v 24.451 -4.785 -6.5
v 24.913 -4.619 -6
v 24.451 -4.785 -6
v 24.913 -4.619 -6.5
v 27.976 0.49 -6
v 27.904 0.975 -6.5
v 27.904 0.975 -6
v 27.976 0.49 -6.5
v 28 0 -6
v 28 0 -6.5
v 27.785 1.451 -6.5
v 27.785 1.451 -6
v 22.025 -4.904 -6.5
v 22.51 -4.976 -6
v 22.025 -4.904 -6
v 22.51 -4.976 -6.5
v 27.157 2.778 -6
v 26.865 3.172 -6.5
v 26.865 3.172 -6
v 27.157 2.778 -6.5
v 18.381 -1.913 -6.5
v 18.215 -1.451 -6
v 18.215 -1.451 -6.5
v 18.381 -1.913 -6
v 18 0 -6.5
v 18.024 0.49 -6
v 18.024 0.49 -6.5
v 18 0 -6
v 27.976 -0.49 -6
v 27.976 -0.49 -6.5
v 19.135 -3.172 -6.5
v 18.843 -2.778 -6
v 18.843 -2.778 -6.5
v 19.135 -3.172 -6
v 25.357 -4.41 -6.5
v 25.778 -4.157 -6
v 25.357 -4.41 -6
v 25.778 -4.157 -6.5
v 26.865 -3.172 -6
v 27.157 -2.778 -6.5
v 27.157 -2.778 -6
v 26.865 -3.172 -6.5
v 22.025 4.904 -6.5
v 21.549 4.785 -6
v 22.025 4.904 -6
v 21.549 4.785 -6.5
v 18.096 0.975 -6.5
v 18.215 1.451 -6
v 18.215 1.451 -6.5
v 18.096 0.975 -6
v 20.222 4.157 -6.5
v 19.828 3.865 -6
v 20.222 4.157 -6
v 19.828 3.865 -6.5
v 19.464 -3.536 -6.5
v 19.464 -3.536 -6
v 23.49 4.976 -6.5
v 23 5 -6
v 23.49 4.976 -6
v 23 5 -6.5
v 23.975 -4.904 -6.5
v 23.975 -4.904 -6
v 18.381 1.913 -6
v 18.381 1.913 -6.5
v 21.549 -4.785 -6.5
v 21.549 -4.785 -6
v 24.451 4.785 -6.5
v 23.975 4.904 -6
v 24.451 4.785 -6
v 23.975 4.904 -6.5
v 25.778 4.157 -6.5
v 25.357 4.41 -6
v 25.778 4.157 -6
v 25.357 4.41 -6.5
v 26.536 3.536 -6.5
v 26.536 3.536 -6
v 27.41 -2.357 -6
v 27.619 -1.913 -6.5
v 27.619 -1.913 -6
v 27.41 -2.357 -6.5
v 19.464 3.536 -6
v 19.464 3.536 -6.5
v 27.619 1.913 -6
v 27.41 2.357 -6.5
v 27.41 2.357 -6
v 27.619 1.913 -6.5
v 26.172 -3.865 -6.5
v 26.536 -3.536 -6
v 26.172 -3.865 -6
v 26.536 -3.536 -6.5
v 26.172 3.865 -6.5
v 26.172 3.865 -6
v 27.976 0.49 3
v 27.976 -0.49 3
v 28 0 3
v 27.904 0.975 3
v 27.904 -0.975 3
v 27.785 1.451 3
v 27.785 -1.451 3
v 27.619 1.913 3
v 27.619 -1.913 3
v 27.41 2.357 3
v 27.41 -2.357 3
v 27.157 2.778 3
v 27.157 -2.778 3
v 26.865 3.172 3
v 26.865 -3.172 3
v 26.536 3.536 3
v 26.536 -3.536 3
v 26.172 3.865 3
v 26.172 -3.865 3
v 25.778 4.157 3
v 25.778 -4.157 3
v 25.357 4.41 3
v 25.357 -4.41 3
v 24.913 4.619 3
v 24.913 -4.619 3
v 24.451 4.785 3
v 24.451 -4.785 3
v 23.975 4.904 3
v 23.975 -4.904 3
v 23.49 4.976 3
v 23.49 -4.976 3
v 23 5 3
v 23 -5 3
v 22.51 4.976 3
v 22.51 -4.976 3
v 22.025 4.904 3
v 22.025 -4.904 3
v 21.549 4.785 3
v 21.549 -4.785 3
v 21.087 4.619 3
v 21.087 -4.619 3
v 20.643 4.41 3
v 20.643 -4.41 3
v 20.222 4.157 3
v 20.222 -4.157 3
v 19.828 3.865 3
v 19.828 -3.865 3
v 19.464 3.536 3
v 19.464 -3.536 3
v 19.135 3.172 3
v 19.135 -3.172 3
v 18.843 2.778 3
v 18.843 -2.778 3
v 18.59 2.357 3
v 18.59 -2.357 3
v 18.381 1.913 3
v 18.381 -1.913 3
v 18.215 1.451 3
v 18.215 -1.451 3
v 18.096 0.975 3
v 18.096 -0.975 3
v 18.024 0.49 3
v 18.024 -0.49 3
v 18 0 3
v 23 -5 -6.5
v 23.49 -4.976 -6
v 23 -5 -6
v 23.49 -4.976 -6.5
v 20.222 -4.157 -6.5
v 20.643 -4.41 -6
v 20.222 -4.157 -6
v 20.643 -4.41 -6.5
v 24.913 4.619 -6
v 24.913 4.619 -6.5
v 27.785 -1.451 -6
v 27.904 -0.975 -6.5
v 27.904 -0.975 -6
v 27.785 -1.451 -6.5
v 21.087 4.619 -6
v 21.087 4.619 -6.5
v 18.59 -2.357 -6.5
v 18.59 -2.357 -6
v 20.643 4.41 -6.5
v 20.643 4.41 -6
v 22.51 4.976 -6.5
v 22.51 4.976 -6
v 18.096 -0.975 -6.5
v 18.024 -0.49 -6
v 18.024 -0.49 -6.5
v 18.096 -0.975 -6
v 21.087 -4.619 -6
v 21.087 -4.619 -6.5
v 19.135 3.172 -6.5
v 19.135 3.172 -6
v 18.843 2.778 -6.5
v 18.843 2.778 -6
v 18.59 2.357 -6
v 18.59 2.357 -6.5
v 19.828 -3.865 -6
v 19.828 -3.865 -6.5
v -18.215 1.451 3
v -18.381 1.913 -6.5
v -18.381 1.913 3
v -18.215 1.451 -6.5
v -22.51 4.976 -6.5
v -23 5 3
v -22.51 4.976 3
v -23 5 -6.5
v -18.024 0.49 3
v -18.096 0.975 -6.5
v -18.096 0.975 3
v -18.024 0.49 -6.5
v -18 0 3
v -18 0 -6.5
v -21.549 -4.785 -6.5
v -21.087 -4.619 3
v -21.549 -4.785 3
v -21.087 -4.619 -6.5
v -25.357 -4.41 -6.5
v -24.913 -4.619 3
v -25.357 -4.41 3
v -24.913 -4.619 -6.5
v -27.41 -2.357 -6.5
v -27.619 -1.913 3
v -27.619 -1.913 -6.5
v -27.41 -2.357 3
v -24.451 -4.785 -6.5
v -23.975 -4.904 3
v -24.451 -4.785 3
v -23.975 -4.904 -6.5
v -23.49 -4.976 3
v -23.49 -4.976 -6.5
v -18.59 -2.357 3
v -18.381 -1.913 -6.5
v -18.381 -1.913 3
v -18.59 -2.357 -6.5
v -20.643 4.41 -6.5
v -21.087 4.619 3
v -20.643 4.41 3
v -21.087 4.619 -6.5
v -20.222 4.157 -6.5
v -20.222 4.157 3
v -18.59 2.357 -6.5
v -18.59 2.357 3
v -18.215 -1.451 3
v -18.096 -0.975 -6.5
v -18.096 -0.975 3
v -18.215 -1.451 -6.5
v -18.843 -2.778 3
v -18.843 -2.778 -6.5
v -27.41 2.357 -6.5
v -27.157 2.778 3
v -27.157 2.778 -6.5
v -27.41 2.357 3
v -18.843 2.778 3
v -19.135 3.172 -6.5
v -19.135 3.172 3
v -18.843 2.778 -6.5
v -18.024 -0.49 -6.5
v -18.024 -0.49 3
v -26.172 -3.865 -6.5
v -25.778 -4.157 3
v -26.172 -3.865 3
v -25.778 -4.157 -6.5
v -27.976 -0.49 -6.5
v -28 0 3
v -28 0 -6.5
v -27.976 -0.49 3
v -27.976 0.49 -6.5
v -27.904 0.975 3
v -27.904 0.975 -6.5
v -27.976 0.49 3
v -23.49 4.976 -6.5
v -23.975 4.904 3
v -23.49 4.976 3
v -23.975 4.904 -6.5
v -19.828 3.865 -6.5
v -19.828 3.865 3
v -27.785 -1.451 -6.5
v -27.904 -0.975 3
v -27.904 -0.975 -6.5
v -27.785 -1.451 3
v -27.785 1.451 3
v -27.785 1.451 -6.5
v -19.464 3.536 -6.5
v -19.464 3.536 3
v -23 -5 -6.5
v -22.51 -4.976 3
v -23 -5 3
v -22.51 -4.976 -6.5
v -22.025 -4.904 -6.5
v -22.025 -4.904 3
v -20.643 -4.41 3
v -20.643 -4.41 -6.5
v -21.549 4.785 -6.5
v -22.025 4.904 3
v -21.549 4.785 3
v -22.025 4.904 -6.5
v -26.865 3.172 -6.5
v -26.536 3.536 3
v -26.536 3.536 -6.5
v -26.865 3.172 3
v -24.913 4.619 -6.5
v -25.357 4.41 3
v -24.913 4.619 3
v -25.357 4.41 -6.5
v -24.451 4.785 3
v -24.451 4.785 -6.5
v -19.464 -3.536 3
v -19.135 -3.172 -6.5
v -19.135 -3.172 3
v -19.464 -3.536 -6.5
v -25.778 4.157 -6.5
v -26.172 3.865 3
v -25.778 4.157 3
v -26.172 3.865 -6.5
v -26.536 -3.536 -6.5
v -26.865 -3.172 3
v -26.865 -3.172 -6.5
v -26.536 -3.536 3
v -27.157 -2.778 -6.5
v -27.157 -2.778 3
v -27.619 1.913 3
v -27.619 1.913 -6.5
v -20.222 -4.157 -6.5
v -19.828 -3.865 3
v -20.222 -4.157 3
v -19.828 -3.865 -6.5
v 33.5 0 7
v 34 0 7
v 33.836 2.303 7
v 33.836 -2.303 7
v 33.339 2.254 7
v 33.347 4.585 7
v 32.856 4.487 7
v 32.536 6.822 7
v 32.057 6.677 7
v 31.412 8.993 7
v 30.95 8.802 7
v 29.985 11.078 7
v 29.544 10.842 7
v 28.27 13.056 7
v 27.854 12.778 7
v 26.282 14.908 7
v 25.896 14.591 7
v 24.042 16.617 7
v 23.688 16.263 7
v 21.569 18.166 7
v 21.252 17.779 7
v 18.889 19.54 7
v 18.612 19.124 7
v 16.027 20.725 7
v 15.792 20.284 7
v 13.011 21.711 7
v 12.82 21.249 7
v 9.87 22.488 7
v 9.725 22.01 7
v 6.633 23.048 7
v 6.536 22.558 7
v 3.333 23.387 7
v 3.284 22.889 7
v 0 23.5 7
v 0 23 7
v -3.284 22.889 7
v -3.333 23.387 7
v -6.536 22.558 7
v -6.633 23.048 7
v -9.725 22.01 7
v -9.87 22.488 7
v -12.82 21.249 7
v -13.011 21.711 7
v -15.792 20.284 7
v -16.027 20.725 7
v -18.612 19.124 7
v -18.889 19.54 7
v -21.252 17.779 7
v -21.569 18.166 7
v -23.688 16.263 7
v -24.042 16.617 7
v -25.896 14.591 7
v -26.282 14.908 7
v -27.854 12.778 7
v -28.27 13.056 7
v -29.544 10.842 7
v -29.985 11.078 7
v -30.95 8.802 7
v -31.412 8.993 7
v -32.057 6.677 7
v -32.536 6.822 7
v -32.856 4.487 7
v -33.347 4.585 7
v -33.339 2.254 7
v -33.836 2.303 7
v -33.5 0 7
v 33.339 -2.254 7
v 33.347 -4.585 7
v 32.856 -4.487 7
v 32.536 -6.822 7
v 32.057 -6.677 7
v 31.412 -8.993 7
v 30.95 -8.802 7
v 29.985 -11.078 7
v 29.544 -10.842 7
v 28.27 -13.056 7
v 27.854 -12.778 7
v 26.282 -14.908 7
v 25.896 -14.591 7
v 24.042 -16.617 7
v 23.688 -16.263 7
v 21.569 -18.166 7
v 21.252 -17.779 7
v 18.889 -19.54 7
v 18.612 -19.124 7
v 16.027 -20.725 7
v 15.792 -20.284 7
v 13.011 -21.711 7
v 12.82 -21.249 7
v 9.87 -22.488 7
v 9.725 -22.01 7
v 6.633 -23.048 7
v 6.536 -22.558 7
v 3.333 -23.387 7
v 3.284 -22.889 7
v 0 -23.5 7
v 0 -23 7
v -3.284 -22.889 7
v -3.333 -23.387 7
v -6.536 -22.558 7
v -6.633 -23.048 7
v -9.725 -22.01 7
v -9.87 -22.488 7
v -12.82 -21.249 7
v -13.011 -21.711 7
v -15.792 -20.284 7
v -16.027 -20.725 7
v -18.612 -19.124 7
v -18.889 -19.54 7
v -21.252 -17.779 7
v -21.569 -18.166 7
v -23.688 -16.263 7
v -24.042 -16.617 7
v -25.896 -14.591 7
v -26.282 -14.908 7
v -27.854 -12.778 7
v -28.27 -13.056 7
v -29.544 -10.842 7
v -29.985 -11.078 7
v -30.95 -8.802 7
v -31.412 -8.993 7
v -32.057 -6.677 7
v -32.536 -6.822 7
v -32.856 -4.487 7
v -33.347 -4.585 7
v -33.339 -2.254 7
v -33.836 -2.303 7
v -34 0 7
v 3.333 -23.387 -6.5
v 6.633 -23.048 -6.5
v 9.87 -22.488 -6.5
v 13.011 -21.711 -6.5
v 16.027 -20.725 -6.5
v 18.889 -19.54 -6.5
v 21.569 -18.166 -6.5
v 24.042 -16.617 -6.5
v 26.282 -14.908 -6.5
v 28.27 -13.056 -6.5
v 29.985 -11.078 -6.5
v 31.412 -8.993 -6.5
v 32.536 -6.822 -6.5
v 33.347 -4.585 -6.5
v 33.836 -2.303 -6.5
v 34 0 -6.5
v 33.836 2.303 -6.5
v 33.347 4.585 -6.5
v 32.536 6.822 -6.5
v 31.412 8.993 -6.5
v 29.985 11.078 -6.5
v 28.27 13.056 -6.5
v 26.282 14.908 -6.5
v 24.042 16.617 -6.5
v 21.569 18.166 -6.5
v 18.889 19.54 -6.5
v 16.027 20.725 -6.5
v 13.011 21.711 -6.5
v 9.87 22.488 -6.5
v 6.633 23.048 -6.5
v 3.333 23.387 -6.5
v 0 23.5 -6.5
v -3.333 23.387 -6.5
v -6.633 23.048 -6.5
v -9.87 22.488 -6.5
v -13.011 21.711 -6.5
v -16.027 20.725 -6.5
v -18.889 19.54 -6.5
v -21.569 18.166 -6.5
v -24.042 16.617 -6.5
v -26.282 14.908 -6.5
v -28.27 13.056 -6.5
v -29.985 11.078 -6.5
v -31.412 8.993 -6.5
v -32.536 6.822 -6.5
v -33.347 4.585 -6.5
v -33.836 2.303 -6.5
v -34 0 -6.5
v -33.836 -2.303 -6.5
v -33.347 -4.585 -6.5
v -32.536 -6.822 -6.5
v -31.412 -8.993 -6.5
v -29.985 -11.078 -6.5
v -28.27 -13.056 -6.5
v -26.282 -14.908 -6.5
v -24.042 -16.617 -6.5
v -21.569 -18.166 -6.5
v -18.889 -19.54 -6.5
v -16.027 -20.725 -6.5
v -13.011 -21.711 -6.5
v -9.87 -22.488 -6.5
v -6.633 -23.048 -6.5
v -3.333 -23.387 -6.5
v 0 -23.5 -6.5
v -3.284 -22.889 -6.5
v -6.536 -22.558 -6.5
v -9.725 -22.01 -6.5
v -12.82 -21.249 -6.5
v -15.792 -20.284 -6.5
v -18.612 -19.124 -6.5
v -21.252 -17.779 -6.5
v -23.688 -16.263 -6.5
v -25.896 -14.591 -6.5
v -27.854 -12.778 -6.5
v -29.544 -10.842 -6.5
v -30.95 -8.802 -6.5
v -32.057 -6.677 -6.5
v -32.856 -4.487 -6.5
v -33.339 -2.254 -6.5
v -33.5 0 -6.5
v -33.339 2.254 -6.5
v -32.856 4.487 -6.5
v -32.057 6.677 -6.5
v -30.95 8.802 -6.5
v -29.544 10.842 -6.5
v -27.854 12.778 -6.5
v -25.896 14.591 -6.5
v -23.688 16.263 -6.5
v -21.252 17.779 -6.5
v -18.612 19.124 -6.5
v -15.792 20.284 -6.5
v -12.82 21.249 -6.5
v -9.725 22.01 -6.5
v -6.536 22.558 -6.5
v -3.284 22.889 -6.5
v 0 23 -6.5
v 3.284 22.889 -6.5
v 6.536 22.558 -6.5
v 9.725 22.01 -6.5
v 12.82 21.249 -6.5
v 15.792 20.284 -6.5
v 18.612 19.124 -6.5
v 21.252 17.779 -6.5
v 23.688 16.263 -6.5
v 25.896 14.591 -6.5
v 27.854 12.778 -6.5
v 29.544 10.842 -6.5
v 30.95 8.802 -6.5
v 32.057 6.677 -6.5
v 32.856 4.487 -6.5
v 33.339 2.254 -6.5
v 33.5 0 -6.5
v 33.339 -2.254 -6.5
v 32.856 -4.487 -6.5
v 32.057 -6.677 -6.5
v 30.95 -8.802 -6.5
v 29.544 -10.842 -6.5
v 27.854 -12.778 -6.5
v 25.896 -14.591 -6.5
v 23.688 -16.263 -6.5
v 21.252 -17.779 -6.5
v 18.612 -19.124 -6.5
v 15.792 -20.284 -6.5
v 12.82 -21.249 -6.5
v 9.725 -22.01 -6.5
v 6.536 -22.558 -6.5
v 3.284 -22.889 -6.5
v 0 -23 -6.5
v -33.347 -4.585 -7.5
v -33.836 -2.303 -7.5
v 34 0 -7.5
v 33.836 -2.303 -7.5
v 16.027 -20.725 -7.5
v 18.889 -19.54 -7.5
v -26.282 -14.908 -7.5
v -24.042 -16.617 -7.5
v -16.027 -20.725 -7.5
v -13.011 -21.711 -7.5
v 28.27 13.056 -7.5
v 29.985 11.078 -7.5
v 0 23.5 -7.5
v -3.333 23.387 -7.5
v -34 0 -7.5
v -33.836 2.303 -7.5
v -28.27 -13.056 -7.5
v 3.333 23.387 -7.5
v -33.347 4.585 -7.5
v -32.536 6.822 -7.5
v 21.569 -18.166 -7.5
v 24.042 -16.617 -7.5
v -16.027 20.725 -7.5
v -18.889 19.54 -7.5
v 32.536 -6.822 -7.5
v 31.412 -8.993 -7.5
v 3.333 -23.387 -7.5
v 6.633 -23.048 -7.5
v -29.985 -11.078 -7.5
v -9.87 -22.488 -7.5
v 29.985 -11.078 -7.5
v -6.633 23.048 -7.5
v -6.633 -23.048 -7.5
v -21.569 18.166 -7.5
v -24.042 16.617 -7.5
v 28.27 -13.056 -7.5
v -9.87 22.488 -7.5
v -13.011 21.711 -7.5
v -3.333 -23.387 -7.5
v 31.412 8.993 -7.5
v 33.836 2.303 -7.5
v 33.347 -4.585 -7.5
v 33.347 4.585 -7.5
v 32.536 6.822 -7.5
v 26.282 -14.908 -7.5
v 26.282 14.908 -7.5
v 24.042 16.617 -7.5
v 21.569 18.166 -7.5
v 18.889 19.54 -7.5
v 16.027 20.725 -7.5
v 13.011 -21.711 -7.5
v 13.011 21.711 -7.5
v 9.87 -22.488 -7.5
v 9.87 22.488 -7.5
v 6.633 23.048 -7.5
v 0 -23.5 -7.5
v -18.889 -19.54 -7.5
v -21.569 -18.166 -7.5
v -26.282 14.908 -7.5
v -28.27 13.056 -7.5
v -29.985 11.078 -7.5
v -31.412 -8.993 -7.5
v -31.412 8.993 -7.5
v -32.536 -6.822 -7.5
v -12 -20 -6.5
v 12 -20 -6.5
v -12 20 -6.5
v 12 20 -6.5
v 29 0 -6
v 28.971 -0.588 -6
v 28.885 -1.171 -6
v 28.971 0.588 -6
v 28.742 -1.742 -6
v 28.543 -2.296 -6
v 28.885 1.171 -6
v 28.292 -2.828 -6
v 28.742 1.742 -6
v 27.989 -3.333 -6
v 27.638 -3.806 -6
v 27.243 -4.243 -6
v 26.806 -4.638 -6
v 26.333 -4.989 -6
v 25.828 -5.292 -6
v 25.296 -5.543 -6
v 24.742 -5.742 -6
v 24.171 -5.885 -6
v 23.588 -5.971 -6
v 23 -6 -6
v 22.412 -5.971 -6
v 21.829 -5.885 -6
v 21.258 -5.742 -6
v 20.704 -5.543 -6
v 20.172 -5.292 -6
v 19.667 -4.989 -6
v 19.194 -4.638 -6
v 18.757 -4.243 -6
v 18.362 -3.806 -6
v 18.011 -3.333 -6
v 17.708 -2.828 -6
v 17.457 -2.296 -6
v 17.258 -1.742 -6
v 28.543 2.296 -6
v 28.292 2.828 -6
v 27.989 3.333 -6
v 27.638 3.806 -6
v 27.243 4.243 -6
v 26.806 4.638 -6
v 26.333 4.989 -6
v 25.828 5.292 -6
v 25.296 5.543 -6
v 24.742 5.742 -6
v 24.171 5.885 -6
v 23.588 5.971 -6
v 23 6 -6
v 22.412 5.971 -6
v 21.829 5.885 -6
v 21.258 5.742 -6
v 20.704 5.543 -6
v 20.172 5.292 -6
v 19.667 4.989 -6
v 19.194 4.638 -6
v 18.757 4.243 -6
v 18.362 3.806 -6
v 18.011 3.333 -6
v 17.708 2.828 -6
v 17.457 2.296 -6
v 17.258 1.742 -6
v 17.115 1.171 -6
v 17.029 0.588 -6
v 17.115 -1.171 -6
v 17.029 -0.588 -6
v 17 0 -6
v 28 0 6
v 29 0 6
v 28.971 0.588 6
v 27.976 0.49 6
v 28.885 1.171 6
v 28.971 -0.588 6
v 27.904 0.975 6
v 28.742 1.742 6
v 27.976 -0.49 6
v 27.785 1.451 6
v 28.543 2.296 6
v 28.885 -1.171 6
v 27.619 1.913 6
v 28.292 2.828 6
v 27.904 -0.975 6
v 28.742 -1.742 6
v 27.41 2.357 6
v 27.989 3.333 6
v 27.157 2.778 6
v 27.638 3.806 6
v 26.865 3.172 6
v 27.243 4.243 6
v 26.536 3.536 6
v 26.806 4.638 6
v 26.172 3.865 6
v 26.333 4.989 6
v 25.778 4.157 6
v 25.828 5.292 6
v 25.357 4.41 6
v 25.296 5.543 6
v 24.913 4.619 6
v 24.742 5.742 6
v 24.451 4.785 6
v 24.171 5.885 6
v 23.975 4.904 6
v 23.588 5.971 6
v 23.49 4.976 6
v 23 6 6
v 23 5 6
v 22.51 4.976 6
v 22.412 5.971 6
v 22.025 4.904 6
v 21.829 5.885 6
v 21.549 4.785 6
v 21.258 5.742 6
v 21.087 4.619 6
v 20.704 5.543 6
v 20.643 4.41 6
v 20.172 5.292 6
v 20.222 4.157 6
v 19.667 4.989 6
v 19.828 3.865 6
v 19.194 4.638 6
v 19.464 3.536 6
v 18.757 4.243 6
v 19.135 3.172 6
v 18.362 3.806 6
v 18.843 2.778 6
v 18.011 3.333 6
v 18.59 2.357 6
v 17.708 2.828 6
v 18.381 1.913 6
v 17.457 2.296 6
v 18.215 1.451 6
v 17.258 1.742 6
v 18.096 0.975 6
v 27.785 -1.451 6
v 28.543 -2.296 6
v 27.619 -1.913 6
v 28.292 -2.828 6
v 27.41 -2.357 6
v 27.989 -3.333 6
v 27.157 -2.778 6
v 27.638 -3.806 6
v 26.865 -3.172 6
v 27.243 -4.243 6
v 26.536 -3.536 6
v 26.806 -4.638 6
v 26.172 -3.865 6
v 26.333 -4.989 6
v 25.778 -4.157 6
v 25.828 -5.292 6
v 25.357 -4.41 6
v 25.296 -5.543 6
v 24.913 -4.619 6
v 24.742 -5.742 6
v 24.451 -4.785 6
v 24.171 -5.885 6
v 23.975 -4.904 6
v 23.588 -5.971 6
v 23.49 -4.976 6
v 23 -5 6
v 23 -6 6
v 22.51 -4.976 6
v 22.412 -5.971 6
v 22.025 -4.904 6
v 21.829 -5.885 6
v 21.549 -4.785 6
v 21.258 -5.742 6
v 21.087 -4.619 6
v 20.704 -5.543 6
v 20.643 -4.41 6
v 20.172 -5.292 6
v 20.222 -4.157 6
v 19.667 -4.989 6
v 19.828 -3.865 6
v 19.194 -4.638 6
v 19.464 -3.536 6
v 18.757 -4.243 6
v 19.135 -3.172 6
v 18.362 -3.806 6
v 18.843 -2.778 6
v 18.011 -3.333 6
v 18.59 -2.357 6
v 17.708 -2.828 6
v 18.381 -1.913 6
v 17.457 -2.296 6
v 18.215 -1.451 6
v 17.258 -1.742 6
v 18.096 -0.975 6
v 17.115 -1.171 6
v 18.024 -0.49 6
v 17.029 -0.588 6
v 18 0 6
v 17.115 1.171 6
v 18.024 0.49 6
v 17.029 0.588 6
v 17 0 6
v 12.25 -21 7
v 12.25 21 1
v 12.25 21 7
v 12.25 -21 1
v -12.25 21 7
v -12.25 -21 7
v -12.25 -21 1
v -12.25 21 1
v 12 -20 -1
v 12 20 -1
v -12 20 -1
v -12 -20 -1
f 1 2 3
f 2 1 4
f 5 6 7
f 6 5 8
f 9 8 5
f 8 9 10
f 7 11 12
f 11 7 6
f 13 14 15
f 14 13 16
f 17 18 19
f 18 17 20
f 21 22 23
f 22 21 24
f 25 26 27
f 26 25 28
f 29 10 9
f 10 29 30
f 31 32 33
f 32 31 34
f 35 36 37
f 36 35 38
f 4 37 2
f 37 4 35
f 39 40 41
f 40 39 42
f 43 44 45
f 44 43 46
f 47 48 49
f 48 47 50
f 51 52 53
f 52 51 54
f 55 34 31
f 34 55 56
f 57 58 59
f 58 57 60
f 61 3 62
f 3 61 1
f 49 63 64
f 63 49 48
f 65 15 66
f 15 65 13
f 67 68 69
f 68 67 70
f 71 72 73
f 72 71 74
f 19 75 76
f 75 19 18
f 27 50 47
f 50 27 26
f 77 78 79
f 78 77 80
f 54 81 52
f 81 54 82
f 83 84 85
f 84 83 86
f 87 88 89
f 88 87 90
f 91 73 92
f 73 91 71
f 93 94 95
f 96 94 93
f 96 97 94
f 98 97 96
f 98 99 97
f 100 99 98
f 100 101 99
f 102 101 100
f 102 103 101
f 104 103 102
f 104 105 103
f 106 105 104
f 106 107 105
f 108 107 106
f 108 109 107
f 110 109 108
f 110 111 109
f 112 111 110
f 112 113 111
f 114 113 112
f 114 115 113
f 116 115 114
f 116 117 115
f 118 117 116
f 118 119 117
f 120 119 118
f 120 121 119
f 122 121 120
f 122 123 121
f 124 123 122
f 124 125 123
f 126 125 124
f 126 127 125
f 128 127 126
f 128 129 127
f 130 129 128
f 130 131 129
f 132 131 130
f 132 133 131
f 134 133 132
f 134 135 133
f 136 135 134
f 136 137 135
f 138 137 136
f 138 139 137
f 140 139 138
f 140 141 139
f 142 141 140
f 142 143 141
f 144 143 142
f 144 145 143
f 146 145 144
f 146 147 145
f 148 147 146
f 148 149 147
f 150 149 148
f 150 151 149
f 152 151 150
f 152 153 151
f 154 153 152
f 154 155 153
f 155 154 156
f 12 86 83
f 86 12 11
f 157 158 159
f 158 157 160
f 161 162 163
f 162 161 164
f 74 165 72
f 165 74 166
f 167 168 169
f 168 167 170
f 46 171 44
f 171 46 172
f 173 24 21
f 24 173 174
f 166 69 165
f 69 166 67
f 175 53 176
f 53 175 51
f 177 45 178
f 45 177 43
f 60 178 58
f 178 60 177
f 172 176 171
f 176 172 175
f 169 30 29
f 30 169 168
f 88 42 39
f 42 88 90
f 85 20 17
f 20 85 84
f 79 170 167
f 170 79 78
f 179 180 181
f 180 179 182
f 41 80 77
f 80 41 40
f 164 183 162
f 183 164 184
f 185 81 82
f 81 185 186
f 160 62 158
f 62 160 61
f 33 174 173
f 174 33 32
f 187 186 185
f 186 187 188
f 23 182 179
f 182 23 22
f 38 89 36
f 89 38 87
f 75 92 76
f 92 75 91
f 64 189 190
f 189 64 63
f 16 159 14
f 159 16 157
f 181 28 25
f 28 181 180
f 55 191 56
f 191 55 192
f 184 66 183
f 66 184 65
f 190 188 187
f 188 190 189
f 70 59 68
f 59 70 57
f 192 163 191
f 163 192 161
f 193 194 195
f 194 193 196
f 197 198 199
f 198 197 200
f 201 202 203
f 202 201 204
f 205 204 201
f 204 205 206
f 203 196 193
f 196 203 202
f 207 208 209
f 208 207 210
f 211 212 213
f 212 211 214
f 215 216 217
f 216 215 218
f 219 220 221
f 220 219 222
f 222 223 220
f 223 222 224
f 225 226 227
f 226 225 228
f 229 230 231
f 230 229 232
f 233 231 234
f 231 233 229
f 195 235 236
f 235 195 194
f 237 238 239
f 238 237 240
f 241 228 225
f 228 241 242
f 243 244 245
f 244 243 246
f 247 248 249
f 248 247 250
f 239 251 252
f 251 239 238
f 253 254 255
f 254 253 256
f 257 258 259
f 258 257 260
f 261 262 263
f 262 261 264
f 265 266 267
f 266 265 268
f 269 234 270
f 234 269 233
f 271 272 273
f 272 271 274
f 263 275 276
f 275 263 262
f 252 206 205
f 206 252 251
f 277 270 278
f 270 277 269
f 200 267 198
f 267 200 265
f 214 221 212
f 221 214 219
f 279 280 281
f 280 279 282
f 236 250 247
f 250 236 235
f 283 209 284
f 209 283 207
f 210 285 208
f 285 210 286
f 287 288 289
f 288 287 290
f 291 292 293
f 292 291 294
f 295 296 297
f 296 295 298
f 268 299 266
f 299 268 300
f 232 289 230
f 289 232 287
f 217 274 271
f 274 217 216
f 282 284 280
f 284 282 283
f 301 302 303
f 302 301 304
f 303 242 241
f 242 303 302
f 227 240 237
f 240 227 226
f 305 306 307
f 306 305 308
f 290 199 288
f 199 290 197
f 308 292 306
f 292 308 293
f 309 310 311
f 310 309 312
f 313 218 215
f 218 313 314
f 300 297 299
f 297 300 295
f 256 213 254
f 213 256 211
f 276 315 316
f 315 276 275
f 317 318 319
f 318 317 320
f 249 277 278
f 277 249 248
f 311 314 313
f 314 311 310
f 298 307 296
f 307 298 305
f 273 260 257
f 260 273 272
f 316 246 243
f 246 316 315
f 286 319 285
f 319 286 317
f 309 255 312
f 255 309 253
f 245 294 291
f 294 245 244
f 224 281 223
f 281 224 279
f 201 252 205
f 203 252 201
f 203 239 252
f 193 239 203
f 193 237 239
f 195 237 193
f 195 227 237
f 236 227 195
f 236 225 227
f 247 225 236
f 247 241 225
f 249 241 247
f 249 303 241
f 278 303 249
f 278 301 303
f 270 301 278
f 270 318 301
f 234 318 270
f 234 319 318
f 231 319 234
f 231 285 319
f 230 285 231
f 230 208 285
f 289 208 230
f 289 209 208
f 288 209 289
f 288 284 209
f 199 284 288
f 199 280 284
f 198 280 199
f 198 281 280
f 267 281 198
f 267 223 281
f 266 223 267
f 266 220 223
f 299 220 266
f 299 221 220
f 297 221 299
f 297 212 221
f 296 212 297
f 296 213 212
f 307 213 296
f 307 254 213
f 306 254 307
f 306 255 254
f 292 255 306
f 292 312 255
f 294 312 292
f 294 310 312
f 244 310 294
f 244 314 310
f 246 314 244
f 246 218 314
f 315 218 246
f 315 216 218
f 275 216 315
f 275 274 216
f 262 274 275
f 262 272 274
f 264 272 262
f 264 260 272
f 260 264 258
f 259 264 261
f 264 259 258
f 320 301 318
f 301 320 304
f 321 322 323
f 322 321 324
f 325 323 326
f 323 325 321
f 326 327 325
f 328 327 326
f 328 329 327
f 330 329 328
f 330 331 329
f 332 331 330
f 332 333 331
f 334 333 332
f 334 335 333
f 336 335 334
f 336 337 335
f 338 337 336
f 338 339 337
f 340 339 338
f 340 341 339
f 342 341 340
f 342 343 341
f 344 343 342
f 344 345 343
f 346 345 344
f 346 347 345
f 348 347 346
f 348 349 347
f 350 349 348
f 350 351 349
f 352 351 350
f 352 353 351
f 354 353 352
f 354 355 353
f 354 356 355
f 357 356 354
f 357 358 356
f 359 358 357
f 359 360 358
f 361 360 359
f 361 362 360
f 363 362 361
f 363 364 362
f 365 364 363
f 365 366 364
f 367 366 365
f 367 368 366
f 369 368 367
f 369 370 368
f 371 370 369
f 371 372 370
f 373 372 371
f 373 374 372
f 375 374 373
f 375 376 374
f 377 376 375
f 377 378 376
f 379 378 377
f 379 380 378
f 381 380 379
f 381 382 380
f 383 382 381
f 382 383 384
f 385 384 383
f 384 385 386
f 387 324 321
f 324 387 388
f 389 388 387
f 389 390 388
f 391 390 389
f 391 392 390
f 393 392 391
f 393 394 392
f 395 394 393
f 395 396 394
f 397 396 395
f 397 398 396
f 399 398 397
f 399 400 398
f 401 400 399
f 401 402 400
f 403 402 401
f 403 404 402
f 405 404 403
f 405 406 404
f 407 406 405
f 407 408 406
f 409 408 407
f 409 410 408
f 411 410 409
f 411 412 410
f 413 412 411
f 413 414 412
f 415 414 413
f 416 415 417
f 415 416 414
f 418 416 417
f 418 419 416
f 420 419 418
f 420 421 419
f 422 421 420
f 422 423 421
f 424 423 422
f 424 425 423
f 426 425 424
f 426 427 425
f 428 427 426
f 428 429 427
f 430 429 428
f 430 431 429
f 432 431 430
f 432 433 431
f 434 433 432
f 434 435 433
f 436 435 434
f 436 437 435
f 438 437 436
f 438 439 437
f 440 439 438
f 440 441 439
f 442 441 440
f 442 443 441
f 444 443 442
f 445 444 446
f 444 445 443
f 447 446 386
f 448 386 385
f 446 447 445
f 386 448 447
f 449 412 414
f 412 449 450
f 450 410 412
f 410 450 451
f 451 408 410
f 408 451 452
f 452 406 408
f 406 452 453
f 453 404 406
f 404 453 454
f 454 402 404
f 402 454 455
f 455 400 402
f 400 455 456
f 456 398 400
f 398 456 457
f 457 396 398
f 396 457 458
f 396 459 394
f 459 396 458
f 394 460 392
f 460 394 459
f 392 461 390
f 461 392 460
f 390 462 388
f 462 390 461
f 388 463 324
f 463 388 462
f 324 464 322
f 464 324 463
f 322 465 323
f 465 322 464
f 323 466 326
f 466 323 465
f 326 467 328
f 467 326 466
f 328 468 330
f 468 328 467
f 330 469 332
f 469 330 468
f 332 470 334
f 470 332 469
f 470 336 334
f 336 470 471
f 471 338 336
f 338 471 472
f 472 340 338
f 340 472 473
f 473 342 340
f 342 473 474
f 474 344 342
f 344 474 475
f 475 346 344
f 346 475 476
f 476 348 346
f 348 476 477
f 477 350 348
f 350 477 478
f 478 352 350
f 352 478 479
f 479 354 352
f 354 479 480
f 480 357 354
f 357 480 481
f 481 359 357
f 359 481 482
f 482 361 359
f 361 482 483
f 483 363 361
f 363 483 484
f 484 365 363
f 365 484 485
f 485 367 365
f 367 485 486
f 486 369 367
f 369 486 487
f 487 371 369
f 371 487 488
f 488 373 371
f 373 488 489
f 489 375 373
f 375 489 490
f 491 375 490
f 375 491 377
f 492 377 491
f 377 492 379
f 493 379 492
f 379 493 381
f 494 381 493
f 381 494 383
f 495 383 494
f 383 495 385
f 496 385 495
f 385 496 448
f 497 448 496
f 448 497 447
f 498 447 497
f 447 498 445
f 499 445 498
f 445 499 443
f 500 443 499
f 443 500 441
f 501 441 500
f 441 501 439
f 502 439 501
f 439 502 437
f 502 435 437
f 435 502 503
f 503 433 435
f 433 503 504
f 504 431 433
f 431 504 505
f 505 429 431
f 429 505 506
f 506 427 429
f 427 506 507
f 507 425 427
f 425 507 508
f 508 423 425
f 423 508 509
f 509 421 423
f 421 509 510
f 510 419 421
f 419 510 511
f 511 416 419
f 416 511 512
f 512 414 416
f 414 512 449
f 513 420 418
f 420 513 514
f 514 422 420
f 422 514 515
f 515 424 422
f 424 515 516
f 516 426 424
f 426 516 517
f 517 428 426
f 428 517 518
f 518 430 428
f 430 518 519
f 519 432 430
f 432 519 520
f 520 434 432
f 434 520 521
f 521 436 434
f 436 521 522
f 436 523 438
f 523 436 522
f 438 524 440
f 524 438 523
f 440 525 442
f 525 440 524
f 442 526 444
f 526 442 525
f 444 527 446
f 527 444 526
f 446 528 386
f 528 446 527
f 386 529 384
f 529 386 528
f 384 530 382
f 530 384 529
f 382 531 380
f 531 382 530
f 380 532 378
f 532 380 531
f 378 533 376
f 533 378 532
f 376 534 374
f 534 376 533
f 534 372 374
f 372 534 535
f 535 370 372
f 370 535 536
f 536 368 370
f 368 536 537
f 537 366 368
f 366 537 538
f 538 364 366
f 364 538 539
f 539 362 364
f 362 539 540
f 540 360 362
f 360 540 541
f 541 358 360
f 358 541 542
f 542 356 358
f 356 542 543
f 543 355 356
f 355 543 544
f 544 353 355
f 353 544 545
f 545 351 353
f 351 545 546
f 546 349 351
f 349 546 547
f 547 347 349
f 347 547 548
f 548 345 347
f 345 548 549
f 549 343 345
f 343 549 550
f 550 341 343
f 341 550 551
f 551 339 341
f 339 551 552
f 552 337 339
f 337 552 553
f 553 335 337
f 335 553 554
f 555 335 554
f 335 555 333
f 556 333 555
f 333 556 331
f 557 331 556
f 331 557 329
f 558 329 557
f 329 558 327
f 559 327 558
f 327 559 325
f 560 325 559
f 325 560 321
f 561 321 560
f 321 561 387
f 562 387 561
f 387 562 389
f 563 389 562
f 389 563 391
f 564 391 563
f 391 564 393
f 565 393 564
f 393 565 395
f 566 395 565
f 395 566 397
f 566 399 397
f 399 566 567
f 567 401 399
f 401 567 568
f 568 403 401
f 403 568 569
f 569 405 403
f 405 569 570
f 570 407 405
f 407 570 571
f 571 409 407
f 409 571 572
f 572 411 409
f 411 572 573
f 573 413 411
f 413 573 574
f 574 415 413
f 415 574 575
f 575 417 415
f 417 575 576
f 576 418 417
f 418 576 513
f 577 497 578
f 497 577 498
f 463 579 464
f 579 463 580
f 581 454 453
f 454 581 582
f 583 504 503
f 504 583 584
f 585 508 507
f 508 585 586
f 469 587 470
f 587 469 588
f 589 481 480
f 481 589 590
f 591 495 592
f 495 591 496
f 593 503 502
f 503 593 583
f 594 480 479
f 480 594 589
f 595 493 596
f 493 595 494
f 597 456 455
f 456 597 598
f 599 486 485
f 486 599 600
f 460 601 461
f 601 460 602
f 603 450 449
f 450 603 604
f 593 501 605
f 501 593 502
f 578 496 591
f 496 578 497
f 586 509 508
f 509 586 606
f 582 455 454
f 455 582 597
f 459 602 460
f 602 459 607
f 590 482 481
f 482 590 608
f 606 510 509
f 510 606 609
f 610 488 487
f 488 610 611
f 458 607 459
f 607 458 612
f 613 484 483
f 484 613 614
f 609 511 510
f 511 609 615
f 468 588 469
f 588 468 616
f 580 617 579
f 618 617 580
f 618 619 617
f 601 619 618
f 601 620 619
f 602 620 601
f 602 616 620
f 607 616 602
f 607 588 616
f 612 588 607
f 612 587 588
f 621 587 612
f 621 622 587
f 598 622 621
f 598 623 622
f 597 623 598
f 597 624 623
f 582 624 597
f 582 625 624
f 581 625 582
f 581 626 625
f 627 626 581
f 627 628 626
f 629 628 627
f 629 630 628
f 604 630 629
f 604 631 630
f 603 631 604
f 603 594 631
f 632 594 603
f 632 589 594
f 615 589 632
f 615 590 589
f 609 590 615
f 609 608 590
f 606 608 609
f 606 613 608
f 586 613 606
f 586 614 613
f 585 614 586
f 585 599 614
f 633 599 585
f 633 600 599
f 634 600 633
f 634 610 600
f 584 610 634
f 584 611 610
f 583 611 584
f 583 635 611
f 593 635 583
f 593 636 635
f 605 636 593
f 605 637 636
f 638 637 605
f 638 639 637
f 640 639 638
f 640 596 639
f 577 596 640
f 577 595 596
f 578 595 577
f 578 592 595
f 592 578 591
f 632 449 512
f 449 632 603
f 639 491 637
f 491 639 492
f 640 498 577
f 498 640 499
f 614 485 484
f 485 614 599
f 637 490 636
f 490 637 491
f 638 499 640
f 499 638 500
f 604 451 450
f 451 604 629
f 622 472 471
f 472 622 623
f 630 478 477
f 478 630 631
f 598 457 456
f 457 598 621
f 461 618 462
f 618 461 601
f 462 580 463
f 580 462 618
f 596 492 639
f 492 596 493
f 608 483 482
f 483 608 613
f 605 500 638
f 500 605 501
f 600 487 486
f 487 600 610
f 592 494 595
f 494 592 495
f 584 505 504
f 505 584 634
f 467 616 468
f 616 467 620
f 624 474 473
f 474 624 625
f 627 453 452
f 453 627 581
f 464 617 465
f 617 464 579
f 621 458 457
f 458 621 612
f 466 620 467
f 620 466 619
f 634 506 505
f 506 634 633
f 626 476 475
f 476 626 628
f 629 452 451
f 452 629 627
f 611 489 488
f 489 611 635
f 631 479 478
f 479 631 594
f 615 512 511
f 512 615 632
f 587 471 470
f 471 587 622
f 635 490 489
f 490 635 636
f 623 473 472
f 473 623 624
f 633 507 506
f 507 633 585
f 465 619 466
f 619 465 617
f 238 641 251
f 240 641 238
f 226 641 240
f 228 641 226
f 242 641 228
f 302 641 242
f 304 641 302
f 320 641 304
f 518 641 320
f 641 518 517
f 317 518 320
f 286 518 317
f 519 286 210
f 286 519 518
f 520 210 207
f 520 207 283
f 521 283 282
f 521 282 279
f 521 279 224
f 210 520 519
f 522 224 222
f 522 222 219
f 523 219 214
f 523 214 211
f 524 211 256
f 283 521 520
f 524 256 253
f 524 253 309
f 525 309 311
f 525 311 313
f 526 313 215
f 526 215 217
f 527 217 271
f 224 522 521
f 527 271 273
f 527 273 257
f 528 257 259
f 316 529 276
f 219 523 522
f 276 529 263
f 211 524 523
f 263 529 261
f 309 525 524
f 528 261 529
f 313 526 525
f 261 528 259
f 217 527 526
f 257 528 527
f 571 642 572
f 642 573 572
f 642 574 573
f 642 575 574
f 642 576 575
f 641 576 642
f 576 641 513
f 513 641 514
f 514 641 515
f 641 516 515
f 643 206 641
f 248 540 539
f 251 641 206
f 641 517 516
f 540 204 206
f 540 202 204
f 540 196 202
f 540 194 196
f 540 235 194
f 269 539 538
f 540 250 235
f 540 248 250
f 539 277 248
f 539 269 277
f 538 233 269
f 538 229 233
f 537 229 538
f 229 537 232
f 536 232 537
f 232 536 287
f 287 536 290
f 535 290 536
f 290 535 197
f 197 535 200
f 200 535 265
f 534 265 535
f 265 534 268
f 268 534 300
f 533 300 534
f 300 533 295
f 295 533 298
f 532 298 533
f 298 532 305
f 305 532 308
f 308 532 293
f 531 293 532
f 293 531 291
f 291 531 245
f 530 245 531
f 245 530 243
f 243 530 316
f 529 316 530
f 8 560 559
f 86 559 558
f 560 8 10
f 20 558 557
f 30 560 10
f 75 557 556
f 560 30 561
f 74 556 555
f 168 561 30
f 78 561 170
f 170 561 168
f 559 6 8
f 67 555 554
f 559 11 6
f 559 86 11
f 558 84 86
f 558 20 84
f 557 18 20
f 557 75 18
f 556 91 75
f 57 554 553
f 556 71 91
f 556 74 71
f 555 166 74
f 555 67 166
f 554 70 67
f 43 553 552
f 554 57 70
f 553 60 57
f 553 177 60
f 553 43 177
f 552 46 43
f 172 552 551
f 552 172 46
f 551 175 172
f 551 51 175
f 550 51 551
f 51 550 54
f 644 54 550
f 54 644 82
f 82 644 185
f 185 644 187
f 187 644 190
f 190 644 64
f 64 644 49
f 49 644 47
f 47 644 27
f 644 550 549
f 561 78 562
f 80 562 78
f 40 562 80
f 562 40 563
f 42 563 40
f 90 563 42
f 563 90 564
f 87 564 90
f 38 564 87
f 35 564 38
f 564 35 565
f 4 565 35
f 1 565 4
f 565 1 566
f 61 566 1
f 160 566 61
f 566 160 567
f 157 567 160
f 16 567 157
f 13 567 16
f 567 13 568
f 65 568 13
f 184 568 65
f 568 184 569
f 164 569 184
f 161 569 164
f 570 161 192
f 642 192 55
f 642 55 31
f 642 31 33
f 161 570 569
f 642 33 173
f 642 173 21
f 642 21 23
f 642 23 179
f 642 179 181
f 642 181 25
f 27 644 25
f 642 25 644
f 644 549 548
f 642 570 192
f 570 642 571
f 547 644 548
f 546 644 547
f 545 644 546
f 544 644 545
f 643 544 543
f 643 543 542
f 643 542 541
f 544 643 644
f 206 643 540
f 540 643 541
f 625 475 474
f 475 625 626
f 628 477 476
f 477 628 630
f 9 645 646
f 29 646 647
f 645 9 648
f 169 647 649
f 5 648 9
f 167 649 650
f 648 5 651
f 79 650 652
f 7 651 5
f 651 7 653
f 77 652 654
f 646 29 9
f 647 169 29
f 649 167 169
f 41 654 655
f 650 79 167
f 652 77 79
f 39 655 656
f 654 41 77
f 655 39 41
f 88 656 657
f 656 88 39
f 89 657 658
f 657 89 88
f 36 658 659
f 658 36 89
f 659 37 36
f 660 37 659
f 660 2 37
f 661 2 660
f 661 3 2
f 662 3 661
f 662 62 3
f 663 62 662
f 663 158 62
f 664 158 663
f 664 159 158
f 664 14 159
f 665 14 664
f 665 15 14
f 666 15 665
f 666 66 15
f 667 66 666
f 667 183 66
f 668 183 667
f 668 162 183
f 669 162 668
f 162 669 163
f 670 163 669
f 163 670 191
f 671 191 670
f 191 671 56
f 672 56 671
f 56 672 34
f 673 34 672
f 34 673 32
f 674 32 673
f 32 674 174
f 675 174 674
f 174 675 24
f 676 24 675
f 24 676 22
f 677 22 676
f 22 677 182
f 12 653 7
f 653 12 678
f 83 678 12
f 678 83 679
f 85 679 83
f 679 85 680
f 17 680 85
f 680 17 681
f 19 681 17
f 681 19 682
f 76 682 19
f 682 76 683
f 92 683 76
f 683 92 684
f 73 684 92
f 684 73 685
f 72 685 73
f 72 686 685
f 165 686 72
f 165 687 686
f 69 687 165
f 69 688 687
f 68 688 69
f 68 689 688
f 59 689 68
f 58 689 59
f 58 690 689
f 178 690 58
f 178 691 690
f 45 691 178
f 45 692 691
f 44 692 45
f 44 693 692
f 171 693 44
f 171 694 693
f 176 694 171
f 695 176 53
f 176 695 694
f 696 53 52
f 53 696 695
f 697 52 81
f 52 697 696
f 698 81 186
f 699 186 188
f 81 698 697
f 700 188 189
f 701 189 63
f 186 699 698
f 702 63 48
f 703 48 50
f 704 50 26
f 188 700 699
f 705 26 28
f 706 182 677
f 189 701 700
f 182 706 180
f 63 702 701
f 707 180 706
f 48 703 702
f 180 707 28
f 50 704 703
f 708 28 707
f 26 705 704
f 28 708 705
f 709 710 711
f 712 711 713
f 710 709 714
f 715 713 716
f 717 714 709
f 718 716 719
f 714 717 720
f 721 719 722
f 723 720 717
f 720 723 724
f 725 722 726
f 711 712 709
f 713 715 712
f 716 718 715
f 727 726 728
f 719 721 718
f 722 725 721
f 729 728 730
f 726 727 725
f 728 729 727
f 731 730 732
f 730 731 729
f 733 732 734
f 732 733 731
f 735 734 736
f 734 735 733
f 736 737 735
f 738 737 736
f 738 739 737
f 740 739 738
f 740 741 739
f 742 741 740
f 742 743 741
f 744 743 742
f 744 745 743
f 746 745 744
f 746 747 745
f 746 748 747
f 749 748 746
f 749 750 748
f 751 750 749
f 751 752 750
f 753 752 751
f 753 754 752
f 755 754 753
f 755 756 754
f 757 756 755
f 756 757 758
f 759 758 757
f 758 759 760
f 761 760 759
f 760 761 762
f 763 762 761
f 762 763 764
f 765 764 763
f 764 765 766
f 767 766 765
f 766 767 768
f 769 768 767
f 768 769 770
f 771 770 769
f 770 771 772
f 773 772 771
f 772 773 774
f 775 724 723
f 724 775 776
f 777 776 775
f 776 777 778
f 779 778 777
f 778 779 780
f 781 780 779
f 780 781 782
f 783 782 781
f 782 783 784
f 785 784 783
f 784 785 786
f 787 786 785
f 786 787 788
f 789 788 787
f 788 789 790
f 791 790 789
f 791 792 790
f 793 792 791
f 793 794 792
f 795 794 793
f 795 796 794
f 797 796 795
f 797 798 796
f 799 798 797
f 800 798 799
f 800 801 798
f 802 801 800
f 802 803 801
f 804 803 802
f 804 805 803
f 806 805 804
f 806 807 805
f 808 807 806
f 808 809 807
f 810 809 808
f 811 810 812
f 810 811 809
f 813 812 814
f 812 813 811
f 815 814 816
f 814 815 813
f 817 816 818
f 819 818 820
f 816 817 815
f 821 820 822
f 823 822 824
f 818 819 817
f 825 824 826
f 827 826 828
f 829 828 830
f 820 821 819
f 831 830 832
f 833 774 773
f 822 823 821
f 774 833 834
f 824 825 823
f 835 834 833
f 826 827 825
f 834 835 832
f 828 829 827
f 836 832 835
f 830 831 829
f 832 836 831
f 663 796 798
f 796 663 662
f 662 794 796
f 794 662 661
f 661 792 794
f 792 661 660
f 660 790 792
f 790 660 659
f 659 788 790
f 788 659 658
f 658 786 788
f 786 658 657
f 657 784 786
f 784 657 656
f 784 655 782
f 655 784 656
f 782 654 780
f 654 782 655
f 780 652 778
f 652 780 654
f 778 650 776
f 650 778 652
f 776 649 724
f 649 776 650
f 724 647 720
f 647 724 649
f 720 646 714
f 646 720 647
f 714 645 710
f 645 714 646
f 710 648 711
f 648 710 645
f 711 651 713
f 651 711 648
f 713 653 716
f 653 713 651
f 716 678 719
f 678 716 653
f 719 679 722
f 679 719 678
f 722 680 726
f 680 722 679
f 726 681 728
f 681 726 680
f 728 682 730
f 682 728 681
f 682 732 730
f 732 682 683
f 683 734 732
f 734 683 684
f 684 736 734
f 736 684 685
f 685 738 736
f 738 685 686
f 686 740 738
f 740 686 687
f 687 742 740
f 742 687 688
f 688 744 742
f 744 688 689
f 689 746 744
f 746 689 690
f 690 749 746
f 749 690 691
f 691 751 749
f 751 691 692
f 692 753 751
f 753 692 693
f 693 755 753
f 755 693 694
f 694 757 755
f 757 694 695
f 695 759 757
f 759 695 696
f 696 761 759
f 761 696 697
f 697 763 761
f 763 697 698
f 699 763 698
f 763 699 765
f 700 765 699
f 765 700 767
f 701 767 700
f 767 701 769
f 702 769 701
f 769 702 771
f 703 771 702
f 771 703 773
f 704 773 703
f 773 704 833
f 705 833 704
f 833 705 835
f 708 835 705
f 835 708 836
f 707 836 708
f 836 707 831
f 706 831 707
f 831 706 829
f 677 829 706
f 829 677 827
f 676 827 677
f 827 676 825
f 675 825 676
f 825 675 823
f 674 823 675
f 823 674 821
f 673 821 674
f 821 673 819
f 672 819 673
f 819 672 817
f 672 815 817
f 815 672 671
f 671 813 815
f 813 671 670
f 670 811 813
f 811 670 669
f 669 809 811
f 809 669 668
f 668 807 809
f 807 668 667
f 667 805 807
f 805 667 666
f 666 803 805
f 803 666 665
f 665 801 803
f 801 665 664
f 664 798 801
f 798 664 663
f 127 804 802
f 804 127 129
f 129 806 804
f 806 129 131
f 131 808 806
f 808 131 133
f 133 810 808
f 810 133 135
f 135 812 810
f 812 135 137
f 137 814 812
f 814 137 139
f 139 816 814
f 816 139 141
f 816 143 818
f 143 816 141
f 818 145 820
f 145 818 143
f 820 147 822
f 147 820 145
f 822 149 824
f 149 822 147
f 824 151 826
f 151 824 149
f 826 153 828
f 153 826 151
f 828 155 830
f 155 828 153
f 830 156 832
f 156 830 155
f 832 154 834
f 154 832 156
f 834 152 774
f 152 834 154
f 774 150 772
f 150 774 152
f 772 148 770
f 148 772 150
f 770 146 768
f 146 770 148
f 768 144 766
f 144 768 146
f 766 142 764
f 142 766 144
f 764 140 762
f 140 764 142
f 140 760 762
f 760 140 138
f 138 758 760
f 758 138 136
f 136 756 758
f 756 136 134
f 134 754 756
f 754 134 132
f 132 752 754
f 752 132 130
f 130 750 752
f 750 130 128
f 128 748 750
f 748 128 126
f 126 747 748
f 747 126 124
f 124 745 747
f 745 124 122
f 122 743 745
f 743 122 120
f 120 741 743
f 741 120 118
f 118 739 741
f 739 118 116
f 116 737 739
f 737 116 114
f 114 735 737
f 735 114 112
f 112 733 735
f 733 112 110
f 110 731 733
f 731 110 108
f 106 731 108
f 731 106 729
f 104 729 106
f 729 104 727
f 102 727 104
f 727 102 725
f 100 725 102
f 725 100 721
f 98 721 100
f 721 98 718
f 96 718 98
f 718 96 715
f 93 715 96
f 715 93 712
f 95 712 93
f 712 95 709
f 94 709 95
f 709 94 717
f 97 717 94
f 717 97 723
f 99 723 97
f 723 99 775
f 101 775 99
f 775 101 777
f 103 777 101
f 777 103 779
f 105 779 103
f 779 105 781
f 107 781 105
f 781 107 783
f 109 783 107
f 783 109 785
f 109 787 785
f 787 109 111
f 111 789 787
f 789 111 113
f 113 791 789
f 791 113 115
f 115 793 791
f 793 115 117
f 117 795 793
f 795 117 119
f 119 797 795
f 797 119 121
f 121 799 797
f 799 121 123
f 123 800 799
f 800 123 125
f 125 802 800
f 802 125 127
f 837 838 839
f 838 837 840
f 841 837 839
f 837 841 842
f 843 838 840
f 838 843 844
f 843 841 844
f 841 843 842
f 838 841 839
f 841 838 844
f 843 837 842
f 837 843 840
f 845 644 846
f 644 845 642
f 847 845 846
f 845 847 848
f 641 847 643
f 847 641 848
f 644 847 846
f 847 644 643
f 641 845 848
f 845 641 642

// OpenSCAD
$fn = 64;

// Плата
PCB_W = 24.5;
PCB_H = 42.0;
PCB_T = 1.0;

COMP_TOP_H = 2.5;
COMP_BOT_H = 2.5;


// Магнит

MAG_D = 10;
MAG_H = 10;

// Плата
color("DarkGreen") {
  translate([0, 0, 4])

  cube([PCB_W, PCB_H, PCB_T + COMP_TOP_H + COMP_BOT_H], center=true);
}


// Аккумулятор
color("lightblue") {
  translate([0, 0, -4])
  cube([24, 40, 6], center=true);
}

// Магниты

MAG_OFFSET = 23;

color("Silver") {
  translate([MAG_OFFSET, 0, -2]) {
    cylinder(d=MAG_D, h=MAG_H, center=true);
  }
  translate([-MAG_OFFSET, 0, -2]) {
    cylinder(d=MAG_D, h=MAG_H, center=true);
  }
}

// Корпус

module ellipse(width, height) {
  scale([1, height/width, 1]) circle(r=width/2);
}

color([1, 1, 1, 0.4]) {
/*color("Blue") {*/

/*cylinder(d=70, h=1.5, center=true);*/

wt = 1.0;

linear_extrude(14, center=true) {
  difference() {
    ellipse(68, 47);
    ellipse(68-wt, 47-wt);
  }
}

translate([0,0,-7])
linear_extrude(1, center=true) {
  ellipse(68, 47);
}

// Ниша под магнит
translate([MAG_OFFSET, 0, 0])
linear_extrude(12, center=true) {
  difference() {
    circle(r = MAG_D/2 + 1);
    circle(r = MAG_D/2);
  }
}

}
